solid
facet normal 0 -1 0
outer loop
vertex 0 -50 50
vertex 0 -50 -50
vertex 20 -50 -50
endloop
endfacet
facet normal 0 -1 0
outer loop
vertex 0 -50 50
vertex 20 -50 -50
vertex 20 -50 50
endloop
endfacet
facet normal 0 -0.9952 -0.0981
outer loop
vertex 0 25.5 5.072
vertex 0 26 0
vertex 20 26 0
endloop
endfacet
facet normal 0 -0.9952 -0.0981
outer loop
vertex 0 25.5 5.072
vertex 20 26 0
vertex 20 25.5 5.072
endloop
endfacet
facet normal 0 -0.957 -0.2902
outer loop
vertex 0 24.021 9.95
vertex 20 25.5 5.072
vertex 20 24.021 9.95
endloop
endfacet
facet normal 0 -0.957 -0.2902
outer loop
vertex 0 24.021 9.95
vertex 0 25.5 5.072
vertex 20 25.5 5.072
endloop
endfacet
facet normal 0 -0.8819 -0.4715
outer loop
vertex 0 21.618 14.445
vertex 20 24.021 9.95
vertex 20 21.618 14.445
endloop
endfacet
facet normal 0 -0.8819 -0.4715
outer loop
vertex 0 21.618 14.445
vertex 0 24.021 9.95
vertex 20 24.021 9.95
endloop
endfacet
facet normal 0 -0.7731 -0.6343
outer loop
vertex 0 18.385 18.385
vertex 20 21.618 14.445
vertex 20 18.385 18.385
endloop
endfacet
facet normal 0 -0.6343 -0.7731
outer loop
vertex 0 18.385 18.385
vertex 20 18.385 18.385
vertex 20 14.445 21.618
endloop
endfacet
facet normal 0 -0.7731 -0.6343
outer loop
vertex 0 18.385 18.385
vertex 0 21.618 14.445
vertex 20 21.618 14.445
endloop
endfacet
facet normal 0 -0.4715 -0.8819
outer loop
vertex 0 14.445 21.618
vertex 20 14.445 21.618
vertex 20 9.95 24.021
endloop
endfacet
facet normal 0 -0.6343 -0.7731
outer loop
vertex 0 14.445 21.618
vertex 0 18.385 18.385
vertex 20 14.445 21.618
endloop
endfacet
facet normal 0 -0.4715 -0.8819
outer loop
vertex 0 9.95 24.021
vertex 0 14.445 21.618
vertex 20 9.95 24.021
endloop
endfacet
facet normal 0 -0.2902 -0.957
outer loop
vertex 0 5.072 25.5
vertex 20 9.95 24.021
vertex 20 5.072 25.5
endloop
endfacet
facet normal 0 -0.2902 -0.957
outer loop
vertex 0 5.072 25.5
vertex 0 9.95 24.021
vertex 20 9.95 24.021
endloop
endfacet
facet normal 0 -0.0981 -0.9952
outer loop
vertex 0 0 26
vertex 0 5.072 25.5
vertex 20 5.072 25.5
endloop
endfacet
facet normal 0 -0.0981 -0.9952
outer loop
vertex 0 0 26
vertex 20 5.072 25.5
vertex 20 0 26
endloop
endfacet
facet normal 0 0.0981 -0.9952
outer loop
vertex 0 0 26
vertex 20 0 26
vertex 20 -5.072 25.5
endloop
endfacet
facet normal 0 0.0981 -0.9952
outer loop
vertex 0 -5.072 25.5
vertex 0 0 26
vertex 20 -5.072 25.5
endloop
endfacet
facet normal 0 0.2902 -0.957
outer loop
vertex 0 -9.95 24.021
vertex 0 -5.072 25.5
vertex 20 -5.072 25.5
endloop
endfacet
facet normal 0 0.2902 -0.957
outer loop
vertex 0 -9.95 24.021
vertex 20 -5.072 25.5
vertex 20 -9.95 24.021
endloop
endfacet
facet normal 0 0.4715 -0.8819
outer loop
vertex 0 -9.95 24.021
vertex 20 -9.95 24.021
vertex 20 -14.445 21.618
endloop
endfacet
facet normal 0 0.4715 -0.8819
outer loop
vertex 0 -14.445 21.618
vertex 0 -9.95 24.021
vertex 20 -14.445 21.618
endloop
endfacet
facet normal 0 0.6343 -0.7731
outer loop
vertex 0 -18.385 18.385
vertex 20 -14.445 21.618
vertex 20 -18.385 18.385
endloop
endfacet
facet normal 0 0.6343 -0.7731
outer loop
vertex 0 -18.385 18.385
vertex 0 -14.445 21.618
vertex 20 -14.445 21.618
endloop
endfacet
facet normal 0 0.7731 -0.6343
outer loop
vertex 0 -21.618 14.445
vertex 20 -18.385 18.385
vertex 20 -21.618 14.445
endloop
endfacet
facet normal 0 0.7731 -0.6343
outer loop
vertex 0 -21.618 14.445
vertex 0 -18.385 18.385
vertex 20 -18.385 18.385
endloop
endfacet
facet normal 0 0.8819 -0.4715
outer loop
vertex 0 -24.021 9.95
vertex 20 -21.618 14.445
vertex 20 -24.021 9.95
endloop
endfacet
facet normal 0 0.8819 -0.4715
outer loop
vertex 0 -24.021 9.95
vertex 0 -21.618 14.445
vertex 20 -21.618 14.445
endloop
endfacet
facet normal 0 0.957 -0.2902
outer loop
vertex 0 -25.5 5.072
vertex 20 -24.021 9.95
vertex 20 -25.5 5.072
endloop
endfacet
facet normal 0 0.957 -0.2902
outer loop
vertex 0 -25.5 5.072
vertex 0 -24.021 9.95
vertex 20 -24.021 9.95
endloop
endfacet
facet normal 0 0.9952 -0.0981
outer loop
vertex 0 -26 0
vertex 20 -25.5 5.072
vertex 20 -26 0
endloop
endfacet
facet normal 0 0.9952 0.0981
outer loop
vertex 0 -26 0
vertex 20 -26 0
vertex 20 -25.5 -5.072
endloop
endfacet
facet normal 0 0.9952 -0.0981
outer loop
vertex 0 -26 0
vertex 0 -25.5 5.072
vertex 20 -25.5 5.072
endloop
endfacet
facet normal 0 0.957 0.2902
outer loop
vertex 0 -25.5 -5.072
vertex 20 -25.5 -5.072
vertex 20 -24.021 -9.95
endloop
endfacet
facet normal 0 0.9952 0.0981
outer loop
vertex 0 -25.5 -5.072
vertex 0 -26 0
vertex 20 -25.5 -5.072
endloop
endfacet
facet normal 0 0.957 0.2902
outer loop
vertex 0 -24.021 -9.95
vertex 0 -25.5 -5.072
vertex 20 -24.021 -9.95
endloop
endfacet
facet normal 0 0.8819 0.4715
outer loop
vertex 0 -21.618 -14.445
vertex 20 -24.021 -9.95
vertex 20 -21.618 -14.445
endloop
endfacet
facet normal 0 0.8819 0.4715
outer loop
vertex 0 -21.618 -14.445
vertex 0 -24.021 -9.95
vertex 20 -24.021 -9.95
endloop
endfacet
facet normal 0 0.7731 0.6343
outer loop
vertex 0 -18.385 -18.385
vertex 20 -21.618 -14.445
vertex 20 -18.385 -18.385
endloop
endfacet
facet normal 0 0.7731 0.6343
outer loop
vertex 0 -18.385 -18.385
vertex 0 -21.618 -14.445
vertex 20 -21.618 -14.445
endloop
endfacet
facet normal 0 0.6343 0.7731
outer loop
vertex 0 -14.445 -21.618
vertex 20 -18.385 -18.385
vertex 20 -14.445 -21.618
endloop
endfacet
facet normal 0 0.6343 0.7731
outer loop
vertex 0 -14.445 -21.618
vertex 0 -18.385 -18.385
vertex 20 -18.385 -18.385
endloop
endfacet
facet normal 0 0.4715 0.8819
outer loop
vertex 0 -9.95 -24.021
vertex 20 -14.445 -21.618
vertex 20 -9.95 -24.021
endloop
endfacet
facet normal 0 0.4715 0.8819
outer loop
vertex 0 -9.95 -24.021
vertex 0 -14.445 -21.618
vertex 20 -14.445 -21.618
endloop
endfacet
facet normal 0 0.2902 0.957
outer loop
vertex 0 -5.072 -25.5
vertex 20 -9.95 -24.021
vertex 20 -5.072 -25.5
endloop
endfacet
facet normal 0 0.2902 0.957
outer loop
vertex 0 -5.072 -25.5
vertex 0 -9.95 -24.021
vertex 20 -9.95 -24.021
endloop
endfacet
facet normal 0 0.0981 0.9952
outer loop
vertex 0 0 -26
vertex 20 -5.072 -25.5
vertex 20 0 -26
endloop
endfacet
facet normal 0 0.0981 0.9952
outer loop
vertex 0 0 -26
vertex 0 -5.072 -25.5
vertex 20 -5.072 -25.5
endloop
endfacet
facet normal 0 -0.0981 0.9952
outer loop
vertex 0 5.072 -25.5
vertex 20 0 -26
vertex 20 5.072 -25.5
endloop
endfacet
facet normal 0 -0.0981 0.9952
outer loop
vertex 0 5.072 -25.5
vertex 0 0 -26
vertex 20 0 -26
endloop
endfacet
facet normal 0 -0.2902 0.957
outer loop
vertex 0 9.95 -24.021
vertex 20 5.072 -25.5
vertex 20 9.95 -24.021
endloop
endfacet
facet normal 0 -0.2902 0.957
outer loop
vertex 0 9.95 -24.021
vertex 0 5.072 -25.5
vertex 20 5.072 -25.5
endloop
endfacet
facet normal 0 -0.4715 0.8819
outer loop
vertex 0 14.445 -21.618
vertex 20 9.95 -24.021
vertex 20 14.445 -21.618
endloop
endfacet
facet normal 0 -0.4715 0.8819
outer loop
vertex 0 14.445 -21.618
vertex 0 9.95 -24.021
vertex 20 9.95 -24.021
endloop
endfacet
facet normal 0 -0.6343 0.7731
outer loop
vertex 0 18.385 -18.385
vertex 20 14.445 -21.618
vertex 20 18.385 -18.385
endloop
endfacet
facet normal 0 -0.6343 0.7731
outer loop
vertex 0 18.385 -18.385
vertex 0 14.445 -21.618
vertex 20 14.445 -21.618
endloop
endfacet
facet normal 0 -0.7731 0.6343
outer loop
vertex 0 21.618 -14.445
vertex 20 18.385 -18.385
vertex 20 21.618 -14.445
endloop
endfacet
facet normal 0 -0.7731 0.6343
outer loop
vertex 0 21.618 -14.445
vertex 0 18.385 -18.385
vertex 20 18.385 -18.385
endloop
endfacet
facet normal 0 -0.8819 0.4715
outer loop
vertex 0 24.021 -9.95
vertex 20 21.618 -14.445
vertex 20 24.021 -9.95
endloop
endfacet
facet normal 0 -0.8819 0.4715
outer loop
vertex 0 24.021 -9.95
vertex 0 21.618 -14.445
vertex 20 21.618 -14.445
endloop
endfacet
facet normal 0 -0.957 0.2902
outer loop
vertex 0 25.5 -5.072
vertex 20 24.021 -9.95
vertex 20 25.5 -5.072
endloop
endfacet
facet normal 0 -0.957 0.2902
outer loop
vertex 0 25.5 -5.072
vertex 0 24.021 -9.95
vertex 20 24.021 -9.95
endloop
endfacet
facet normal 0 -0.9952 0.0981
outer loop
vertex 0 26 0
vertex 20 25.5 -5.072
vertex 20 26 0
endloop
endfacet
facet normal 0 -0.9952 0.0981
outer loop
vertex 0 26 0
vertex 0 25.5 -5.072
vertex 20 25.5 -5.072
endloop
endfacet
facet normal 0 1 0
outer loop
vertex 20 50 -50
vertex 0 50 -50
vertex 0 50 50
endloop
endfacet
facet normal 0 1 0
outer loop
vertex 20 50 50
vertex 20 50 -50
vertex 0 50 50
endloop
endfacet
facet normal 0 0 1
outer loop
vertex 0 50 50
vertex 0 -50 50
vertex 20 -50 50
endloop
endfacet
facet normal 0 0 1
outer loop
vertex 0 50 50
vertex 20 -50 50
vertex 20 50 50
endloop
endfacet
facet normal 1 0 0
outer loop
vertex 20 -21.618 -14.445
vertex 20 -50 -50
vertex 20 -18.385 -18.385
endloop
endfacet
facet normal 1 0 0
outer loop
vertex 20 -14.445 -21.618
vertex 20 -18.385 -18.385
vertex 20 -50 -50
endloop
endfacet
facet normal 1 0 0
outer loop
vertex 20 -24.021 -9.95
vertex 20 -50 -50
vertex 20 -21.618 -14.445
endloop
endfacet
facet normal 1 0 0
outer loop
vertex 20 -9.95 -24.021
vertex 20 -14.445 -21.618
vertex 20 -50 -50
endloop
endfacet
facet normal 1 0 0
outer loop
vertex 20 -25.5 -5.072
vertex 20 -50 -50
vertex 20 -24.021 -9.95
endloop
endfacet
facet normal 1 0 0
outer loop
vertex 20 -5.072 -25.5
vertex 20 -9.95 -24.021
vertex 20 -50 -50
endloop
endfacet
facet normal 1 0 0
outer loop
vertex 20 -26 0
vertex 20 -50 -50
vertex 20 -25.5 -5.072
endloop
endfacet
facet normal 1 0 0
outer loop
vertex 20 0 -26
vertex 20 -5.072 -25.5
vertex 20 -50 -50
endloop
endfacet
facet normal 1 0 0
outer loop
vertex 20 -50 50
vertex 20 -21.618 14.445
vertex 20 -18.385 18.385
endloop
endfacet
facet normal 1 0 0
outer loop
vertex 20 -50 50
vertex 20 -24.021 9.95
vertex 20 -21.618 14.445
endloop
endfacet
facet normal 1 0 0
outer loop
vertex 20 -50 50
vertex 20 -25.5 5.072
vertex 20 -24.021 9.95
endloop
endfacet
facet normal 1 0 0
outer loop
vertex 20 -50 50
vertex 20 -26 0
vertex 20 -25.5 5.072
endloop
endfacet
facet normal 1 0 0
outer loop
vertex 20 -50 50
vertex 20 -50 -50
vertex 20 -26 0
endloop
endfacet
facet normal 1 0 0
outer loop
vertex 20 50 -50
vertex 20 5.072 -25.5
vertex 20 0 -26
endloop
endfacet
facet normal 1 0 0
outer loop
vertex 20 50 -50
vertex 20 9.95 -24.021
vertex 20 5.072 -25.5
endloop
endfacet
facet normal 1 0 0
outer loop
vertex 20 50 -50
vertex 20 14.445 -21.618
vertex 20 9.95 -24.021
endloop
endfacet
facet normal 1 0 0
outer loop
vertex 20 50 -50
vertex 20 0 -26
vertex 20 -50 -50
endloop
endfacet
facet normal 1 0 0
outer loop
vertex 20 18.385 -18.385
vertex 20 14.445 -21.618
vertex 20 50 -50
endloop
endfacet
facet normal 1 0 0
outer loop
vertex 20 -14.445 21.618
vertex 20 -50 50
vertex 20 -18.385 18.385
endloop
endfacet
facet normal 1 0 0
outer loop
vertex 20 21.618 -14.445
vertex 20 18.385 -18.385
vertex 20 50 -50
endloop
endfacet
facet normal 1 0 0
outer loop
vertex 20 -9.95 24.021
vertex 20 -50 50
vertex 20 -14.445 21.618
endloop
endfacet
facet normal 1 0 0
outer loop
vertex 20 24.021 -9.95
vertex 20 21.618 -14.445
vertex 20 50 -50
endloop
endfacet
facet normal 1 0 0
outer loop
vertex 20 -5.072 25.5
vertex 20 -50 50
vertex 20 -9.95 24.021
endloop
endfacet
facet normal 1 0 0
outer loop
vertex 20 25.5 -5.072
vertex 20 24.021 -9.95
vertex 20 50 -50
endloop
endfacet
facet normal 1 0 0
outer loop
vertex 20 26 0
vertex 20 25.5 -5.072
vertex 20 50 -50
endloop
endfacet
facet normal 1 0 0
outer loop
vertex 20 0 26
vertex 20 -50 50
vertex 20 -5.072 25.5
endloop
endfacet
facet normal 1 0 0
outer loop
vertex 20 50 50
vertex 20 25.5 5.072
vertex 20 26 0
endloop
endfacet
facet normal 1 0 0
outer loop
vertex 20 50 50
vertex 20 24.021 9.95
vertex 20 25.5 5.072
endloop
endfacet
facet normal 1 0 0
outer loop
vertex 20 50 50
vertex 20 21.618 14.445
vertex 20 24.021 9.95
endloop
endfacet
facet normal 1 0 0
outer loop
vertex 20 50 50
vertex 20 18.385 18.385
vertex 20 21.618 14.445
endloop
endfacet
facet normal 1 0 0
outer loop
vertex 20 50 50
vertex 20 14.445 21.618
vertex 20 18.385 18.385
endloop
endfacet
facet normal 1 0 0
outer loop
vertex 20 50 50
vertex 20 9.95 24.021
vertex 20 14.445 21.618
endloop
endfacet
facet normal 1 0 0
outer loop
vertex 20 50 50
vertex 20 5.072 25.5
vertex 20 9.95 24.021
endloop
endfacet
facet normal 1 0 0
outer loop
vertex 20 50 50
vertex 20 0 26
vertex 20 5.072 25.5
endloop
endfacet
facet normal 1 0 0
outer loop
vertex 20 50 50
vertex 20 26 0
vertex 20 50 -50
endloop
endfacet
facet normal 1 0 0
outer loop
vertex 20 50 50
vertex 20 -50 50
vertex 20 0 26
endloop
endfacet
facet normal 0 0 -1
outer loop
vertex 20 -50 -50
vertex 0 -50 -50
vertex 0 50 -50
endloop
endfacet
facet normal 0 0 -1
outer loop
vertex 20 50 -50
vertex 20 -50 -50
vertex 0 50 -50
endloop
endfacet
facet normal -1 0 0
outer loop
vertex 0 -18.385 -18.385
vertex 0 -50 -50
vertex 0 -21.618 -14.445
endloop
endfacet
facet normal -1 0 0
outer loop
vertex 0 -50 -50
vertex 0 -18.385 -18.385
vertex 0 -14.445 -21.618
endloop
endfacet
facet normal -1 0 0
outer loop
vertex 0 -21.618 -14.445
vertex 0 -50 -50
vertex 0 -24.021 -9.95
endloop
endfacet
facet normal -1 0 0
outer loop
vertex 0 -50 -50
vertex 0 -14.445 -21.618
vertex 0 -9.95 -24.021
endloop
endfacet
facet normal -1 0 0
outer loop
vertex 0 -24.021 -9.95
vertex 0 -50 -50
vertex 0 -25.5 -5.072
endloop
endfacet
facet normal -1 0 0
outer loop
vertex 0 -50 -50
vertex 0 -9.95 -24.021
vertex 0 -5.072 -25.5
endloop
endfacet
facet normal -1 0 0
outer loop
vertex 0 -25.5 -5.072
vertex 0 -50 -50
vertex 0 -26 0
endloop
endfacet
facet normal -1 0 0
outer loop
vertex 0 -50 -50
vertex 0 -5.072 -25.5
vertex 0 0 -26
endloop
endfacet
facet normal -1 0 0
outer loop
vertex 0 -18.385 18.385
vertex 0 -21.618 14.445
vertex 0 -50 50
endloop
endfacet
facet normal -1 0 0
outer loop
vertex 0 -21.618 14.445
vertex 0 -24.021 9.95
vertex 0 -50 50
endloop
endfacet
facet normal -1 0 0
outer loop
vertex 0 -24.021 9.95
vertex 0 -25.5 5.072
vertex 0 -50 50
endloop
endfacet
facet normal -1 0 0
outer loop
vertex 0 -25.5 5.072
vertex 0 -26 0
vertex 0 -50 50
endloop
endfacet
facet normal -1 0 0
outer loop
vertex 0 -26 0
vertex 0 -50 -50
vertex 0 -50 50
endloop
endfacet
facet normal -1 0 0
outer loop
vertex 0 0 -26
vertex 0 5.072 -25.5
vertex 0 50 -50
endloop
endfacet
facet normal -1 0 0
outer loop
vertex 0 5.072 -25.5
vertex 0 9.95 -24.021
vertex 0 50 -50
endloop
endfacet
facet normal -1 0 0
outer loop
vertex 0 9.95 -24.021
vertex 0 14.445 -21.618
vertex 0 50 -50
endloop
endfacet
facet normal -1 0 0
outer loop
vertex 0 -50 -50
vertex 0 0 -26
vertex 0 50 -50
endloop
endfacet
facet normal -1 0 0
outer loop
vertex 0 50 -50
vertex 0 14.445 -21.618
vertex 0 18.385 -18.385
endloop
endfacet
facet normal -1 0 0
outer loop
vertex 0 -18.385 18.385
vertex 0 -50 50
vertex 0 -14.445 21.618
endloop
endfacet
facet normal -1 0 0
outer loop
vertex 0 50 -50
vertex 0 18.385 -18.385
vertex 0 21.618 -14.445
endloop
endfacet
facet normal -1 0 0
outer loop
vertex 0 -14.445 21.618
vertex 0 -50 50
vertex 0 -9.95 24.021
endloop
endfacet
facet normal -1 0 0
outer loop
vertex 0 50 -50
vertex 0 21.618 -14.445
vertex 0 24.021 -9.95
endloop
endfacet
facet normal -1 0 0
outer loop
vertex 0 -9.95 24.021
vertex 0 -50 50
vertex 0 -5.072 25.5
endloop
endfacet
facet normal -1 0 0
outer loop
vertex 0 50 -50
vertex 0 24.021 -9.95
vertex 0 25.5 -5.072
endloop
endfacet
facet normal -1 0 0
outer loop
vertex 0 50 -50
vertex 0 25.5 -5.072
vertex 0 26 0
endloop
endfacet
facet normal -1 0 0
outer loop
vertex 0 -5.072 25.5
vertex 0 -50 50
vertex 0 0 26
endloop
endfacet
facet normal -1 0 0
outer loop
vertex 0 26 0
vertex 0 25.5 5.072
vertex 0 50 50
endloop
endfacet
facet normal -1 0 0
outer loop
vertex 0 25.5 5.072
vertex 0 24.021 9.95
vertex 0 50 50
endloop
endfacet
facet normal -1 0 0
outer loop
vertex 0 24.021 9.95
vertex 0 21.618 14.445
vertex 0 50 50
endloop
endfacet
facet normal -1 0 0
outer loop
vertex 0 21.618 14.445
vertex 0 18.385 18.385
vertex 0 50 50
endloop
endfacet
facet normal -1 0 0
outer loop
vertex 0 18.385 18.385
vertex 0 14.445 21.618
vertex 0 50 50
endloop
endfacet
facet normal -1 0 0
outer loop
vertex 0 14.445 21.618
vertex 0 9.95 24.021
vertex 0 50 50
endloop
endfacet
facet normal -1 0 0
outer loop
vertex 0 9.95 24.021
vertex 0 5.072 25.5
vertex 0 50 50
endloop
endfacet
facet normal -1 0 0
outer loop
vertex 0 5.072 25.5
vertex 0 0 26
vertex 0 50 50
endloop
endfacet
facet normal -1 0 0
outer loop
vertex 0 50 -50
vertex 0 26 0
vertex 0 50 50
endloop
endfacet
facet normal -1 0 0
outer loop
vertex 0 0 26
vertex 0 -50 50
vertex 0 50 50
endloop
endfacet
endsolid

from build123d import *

# Parameters (mm, degrees)
F0_W     = 100
F0_H     = 100
F0_R     = 26
F1_DEPTH = 20


with BuildPart() as f1:
    # F0 (on Right) → F1 (new body)
    with BuildSketch(Plane.YZ):
        Rectangle(F0_W, F0_H)
        Circle(F0_R, mode=Mode.SUBTRACT)
    extrude(amount=F1_DEPTH)


solid = f1.part
